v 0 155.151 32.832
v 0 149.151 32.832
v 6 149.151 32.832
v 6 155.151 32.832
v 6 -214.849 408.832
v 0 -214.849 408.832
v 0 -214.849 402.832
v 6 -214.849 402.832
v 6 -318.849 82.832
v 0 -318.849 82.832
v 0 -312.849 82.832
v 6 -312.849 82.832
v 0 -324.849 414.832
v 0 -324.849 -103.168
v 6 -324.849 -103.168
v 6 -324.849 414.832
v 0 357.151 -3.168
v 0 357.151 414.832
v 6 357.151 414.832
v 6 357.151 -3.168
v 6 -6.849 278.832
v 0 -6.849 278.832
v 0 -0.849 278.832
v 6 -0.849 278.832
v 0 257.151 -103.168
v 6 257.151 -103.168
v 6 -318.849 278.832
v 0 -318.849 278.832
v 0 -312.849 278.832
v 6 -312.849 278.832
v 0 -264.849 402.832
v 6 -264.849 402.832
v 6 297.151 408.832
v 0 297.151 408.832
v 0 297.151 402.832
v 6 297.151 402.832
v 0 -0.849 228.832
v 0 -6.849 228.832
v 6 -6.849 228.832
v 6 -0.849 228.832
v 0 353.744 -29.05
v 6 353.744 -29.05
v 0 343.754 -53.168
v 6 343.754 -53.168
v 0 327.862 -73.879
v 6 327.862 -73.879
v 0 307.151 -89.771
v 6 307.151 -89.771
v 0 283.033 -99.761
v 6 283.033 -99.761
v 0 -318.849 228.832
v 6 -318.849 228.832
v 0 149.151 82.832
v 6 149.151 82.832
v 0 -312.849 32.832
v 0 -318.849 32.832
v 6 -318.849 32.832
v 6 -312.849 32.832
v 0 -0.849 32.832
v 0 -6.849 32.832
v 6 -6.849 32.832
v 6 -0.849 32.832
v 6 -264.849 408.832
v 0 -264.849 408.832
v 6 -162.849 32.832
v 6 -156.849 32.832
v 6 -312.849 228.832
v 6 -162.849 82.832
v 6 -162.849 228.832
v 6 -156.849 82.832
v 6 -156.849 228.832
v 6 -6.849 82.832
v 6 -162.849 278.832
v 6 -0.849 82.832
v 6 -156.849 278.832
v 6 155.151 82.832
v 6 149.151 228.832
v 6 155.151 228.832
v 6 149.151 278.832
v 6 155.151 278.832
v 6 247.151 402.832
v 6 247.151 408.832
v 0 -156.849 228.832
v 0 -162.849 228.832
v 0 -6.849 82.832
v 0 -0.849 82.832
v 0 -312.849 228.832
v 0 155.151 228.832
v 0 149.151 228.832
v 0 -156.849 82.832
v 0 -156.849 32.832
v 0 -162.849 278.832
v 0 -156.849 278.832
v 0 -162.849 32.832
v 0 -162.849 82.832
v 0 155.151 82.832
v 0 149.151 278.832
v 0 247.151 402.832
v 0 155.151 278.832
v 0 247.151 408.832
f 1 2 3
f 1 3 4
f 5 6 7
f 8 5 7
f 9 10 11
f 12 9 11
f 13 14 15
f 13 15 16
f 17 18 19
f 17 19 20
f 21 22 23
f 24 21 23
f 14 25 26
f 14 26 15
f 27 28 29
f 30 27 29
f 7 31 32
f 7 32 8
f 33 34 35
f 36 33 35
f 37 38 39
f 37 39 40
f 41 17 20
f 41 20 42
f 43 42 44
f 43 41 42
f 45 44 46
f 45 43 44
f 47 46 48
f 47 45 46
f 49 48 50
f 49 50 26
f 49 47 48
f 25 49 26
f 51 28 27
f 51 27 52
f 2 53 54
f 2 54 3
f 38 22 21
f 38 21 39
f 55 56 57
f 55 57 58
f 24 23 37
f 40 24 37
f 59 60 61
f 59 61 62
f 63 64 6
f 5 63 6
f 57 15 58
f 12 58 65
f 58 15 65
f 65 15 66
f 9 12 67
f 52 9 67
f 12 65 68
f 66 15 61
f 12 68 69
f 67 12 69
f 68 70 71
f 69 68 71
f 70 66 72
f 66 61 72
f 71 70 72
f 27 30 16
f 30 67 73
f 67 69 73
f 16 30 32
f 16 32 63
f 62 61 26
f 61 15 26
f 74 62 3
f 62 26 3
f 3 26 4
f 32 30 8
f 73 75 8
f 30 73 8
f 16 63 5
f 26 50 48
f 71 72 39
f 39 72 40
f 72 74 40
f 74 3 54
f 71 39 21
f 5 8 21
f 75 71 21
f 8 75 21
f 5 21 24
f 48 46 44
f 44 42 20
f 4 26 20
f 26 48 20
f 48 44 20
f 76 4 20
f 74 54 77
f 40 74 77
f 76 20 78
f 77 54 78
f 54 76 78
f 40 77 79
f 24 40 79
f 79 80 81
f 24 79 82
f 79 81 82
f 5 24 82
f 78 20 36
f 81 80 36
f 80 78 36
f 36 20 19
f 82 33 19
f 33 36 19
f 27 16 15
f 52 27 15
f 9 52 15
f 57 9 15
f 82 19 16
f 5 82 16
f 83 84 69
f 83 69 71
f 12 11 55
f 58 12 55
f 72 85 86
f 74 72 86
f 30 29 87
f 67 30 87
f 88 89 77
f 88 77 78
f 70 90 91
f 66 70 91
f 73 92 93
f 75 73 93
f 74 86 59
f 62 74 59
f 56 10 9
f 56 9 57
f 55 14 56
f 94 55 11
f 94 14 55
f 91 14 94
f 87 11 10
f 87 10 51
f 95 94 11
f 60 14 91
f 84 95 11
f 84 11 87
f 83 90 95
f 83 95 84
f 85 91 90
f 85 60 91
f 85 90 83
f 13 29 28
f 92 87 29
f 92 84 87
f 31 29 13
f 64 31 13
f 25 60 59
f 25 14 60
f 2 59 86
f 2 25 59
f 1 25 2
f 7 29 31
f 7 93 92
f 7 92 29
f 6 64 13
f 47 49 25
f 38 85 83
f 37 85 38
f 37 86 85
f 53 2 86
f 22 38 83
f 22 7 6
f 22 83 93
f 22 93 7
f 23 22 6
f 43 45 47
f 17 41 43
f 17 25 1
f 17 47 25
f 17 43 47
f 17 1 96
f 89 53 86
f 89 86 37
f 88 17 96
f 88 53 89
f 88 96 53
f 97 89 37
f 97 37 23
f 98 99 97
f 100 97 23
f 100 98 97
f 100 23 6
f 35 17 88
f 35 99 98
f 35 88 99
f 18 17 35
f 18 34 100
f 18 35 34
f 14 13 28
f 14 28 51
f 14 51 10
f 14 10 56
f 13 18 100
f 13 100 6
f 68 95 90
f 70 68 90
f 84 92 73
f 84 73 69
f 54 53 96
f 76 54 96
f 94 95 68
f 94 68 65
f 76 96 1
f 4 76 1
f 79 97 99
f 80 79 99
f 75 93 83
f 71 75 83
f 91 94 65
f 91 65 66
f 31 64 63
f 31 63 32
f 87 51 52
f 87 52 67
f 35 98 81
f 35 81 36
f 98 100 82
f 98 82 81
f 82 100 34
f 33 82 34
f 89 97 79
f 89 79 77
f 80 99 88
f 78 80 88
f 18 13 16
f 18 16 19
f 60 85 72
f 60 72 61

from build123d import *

# Parameters (mm, degrees)
SKETCH1_W           = 6
SKETCH1_H           = 50
SKETCH1_W_2         = 50
SKETCH1_H_2         = 6
BOSS_EXTRUDE1_DEPTH = 6


with BuildPart() as part:
    # Sketch1 → Boss-Extrude1 (new body)
    with BuildSketch(Plane(origin=(0, 0, 0), x_dir=(0, 0, -1), z_dir=(1, 0, 0))):
        with BuildLine():
            Line((-414.831767264, 357.151199882), (3.168232736, 357.151199882))
            ThreePointArc((3.168232736, 357.151199882), (73.878910855, 327.861878001), (103.168232736, 257.151199882))
            Line((103.168232736, 257.151199882), (103.168232736, -324.848800118))
            Line((103.168232736, -324.848800118), (-414.831767264, -324.848800118))
            Line((-414.831767264, -324.848800118), (-414.831767264, 357.151199882))
        make_face()
        with Locations((-405.831767264, 272.151199882)):
            Rectangle(SKETCH1_W, SKETCH1_H, mode=Mode.SUBTRACT)
        with Locations((-253.831767264, -315.848800118)):
            Rectangle(SKETCH1_W_2, SKETCH1_H_2, mode=Mode.SUBTRACT)
        with Locations((-57.831767264, -315.848800118)):
            Rectangle(SKETCH1_W_2, SKETCH1_H_2, mode=Mode.SUBTRACT)
        with Locations((-253.831767264, -159.848800118)):
            Rectangle(SKETCH1_W_2, SKETCH1_H_2, mode=Mode.SUBTRACT)
        with Locations((-57.831767264, -159.848800118)):
            Rectangle(SKETCH1_W_2, SKETCH1_H_2, mode=Mode.SUBTRACT)
        with Locations((-253.831767264, -3.848800118)):
            Rectangle(SKETCH1_W_2, SKETCH1_H_2, mode=Mode.SUBTRACT)
        with Locations((-57.831767264, -3.848800118)):
            Rectangle(SKETCH1_W_2, SKETCH1_H_2, mode=Mode.SUBTRACT)
        with Locations((-253.831767264, 152.151199882)):
            Rectangle(SKETCH1_W_2, SKETCH1_H_2, mode=Mode.SUBTRACT)
        with Locations((-57.831767264, 152.151199882)):
            Rectangle(SKETCH1_W_2, SKETCH1_H_2, mode=Mode.SUBTRACT)
        with Locations((-405.831767264, -239.848800118)):
            Rectangle(SKETCH1_W, SKETCH1_H, mode=Mode.SUBTRACT)
    extrude(amount=BOSS_EXTRUDE1_DEPTH)


solid = part.part
